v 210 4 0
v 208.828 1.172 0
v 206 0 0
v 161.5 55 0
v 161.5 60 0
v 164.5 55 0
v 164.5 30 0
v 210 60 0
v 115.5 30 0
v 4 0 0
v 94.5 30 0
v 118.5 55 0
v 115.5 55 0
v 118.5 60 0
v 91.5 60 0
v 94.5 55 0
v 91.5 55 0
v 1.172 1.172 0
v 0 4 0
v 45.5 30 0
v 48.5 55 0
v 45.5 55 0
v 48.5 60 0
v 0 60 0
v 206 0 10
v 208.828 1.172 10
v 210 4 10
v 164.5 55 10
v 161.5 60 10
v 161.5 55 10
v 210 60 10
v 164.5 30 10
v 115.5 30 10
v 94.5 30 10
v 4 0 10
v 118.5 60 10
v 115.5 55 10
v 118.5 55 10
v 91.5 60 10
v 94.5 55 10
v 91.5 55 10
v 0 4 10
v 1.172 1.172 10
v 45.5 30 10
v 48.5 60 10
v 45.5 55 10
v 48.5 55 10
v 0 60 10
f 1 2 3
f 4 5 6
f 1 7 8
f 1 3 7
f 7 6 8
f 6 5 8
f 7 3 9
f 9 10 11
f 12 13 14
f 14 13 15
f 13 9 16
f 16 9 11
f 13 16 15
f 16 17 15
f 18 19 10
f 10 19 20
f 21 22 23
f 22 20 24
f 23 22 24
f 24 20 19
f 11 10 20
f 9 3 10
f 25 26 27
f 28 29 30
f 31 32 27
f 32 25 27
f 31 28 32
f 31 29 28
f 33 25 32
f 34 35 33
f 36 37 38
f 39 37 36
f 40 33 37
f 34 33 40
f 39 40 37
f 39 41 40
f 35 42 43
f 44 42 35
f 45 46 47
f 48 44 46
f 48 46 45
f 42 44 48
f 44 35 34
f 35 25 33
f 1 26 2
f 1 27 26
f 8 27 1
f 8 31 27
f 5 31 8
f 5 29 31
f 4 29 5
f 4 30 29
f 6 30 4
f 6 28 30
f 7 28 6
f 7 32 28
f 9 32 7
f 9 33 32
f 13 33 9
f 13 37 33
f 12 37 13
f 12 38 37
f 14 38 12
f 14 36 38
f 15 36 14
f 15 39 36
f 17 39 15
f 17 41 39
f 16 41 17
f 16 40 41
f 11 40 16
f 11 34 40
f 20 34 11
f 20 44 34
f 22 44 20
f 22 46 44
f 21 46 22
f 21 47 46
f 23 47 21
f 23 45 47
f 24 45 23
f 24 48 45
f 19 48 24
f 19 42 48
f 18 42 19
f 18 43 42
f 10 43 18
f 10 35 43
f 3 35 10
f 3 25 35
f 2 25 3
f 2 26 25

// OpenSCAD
$fn = 32;

// ----------------------------------------------------------------------
// Oversize slot bar: 210 mm bar with 2 oversize windows
// ----------------------------------------------------------------------

// --- parameters (mm) ---
profile_height = 10;      // extrusion height
profile_points = 24;      // points of the closed outline

profile = [[0, 4], [1.172, 1.172], [4, 0], [206, 0], [208.828, 1.172], [210, 4], [210, 60], [161.5, 60], [161.5, 55], [164.5, 55], [164.5, 30], [115.5, 30], [115.5, 55], [118.5, 55], [118.5, 60], [91.5, 60], [91.5, 55], [94.5, 55], [94.5, 30], [45.5, 30], [45.5, 55], [48.5, 55], [48.5, 60], [0, 60]];  // single closed polygon, 24 points, counter clockwise

// --- the one profile operation ---
linear_extrude(height = profile_height) polygon(points = profile);
